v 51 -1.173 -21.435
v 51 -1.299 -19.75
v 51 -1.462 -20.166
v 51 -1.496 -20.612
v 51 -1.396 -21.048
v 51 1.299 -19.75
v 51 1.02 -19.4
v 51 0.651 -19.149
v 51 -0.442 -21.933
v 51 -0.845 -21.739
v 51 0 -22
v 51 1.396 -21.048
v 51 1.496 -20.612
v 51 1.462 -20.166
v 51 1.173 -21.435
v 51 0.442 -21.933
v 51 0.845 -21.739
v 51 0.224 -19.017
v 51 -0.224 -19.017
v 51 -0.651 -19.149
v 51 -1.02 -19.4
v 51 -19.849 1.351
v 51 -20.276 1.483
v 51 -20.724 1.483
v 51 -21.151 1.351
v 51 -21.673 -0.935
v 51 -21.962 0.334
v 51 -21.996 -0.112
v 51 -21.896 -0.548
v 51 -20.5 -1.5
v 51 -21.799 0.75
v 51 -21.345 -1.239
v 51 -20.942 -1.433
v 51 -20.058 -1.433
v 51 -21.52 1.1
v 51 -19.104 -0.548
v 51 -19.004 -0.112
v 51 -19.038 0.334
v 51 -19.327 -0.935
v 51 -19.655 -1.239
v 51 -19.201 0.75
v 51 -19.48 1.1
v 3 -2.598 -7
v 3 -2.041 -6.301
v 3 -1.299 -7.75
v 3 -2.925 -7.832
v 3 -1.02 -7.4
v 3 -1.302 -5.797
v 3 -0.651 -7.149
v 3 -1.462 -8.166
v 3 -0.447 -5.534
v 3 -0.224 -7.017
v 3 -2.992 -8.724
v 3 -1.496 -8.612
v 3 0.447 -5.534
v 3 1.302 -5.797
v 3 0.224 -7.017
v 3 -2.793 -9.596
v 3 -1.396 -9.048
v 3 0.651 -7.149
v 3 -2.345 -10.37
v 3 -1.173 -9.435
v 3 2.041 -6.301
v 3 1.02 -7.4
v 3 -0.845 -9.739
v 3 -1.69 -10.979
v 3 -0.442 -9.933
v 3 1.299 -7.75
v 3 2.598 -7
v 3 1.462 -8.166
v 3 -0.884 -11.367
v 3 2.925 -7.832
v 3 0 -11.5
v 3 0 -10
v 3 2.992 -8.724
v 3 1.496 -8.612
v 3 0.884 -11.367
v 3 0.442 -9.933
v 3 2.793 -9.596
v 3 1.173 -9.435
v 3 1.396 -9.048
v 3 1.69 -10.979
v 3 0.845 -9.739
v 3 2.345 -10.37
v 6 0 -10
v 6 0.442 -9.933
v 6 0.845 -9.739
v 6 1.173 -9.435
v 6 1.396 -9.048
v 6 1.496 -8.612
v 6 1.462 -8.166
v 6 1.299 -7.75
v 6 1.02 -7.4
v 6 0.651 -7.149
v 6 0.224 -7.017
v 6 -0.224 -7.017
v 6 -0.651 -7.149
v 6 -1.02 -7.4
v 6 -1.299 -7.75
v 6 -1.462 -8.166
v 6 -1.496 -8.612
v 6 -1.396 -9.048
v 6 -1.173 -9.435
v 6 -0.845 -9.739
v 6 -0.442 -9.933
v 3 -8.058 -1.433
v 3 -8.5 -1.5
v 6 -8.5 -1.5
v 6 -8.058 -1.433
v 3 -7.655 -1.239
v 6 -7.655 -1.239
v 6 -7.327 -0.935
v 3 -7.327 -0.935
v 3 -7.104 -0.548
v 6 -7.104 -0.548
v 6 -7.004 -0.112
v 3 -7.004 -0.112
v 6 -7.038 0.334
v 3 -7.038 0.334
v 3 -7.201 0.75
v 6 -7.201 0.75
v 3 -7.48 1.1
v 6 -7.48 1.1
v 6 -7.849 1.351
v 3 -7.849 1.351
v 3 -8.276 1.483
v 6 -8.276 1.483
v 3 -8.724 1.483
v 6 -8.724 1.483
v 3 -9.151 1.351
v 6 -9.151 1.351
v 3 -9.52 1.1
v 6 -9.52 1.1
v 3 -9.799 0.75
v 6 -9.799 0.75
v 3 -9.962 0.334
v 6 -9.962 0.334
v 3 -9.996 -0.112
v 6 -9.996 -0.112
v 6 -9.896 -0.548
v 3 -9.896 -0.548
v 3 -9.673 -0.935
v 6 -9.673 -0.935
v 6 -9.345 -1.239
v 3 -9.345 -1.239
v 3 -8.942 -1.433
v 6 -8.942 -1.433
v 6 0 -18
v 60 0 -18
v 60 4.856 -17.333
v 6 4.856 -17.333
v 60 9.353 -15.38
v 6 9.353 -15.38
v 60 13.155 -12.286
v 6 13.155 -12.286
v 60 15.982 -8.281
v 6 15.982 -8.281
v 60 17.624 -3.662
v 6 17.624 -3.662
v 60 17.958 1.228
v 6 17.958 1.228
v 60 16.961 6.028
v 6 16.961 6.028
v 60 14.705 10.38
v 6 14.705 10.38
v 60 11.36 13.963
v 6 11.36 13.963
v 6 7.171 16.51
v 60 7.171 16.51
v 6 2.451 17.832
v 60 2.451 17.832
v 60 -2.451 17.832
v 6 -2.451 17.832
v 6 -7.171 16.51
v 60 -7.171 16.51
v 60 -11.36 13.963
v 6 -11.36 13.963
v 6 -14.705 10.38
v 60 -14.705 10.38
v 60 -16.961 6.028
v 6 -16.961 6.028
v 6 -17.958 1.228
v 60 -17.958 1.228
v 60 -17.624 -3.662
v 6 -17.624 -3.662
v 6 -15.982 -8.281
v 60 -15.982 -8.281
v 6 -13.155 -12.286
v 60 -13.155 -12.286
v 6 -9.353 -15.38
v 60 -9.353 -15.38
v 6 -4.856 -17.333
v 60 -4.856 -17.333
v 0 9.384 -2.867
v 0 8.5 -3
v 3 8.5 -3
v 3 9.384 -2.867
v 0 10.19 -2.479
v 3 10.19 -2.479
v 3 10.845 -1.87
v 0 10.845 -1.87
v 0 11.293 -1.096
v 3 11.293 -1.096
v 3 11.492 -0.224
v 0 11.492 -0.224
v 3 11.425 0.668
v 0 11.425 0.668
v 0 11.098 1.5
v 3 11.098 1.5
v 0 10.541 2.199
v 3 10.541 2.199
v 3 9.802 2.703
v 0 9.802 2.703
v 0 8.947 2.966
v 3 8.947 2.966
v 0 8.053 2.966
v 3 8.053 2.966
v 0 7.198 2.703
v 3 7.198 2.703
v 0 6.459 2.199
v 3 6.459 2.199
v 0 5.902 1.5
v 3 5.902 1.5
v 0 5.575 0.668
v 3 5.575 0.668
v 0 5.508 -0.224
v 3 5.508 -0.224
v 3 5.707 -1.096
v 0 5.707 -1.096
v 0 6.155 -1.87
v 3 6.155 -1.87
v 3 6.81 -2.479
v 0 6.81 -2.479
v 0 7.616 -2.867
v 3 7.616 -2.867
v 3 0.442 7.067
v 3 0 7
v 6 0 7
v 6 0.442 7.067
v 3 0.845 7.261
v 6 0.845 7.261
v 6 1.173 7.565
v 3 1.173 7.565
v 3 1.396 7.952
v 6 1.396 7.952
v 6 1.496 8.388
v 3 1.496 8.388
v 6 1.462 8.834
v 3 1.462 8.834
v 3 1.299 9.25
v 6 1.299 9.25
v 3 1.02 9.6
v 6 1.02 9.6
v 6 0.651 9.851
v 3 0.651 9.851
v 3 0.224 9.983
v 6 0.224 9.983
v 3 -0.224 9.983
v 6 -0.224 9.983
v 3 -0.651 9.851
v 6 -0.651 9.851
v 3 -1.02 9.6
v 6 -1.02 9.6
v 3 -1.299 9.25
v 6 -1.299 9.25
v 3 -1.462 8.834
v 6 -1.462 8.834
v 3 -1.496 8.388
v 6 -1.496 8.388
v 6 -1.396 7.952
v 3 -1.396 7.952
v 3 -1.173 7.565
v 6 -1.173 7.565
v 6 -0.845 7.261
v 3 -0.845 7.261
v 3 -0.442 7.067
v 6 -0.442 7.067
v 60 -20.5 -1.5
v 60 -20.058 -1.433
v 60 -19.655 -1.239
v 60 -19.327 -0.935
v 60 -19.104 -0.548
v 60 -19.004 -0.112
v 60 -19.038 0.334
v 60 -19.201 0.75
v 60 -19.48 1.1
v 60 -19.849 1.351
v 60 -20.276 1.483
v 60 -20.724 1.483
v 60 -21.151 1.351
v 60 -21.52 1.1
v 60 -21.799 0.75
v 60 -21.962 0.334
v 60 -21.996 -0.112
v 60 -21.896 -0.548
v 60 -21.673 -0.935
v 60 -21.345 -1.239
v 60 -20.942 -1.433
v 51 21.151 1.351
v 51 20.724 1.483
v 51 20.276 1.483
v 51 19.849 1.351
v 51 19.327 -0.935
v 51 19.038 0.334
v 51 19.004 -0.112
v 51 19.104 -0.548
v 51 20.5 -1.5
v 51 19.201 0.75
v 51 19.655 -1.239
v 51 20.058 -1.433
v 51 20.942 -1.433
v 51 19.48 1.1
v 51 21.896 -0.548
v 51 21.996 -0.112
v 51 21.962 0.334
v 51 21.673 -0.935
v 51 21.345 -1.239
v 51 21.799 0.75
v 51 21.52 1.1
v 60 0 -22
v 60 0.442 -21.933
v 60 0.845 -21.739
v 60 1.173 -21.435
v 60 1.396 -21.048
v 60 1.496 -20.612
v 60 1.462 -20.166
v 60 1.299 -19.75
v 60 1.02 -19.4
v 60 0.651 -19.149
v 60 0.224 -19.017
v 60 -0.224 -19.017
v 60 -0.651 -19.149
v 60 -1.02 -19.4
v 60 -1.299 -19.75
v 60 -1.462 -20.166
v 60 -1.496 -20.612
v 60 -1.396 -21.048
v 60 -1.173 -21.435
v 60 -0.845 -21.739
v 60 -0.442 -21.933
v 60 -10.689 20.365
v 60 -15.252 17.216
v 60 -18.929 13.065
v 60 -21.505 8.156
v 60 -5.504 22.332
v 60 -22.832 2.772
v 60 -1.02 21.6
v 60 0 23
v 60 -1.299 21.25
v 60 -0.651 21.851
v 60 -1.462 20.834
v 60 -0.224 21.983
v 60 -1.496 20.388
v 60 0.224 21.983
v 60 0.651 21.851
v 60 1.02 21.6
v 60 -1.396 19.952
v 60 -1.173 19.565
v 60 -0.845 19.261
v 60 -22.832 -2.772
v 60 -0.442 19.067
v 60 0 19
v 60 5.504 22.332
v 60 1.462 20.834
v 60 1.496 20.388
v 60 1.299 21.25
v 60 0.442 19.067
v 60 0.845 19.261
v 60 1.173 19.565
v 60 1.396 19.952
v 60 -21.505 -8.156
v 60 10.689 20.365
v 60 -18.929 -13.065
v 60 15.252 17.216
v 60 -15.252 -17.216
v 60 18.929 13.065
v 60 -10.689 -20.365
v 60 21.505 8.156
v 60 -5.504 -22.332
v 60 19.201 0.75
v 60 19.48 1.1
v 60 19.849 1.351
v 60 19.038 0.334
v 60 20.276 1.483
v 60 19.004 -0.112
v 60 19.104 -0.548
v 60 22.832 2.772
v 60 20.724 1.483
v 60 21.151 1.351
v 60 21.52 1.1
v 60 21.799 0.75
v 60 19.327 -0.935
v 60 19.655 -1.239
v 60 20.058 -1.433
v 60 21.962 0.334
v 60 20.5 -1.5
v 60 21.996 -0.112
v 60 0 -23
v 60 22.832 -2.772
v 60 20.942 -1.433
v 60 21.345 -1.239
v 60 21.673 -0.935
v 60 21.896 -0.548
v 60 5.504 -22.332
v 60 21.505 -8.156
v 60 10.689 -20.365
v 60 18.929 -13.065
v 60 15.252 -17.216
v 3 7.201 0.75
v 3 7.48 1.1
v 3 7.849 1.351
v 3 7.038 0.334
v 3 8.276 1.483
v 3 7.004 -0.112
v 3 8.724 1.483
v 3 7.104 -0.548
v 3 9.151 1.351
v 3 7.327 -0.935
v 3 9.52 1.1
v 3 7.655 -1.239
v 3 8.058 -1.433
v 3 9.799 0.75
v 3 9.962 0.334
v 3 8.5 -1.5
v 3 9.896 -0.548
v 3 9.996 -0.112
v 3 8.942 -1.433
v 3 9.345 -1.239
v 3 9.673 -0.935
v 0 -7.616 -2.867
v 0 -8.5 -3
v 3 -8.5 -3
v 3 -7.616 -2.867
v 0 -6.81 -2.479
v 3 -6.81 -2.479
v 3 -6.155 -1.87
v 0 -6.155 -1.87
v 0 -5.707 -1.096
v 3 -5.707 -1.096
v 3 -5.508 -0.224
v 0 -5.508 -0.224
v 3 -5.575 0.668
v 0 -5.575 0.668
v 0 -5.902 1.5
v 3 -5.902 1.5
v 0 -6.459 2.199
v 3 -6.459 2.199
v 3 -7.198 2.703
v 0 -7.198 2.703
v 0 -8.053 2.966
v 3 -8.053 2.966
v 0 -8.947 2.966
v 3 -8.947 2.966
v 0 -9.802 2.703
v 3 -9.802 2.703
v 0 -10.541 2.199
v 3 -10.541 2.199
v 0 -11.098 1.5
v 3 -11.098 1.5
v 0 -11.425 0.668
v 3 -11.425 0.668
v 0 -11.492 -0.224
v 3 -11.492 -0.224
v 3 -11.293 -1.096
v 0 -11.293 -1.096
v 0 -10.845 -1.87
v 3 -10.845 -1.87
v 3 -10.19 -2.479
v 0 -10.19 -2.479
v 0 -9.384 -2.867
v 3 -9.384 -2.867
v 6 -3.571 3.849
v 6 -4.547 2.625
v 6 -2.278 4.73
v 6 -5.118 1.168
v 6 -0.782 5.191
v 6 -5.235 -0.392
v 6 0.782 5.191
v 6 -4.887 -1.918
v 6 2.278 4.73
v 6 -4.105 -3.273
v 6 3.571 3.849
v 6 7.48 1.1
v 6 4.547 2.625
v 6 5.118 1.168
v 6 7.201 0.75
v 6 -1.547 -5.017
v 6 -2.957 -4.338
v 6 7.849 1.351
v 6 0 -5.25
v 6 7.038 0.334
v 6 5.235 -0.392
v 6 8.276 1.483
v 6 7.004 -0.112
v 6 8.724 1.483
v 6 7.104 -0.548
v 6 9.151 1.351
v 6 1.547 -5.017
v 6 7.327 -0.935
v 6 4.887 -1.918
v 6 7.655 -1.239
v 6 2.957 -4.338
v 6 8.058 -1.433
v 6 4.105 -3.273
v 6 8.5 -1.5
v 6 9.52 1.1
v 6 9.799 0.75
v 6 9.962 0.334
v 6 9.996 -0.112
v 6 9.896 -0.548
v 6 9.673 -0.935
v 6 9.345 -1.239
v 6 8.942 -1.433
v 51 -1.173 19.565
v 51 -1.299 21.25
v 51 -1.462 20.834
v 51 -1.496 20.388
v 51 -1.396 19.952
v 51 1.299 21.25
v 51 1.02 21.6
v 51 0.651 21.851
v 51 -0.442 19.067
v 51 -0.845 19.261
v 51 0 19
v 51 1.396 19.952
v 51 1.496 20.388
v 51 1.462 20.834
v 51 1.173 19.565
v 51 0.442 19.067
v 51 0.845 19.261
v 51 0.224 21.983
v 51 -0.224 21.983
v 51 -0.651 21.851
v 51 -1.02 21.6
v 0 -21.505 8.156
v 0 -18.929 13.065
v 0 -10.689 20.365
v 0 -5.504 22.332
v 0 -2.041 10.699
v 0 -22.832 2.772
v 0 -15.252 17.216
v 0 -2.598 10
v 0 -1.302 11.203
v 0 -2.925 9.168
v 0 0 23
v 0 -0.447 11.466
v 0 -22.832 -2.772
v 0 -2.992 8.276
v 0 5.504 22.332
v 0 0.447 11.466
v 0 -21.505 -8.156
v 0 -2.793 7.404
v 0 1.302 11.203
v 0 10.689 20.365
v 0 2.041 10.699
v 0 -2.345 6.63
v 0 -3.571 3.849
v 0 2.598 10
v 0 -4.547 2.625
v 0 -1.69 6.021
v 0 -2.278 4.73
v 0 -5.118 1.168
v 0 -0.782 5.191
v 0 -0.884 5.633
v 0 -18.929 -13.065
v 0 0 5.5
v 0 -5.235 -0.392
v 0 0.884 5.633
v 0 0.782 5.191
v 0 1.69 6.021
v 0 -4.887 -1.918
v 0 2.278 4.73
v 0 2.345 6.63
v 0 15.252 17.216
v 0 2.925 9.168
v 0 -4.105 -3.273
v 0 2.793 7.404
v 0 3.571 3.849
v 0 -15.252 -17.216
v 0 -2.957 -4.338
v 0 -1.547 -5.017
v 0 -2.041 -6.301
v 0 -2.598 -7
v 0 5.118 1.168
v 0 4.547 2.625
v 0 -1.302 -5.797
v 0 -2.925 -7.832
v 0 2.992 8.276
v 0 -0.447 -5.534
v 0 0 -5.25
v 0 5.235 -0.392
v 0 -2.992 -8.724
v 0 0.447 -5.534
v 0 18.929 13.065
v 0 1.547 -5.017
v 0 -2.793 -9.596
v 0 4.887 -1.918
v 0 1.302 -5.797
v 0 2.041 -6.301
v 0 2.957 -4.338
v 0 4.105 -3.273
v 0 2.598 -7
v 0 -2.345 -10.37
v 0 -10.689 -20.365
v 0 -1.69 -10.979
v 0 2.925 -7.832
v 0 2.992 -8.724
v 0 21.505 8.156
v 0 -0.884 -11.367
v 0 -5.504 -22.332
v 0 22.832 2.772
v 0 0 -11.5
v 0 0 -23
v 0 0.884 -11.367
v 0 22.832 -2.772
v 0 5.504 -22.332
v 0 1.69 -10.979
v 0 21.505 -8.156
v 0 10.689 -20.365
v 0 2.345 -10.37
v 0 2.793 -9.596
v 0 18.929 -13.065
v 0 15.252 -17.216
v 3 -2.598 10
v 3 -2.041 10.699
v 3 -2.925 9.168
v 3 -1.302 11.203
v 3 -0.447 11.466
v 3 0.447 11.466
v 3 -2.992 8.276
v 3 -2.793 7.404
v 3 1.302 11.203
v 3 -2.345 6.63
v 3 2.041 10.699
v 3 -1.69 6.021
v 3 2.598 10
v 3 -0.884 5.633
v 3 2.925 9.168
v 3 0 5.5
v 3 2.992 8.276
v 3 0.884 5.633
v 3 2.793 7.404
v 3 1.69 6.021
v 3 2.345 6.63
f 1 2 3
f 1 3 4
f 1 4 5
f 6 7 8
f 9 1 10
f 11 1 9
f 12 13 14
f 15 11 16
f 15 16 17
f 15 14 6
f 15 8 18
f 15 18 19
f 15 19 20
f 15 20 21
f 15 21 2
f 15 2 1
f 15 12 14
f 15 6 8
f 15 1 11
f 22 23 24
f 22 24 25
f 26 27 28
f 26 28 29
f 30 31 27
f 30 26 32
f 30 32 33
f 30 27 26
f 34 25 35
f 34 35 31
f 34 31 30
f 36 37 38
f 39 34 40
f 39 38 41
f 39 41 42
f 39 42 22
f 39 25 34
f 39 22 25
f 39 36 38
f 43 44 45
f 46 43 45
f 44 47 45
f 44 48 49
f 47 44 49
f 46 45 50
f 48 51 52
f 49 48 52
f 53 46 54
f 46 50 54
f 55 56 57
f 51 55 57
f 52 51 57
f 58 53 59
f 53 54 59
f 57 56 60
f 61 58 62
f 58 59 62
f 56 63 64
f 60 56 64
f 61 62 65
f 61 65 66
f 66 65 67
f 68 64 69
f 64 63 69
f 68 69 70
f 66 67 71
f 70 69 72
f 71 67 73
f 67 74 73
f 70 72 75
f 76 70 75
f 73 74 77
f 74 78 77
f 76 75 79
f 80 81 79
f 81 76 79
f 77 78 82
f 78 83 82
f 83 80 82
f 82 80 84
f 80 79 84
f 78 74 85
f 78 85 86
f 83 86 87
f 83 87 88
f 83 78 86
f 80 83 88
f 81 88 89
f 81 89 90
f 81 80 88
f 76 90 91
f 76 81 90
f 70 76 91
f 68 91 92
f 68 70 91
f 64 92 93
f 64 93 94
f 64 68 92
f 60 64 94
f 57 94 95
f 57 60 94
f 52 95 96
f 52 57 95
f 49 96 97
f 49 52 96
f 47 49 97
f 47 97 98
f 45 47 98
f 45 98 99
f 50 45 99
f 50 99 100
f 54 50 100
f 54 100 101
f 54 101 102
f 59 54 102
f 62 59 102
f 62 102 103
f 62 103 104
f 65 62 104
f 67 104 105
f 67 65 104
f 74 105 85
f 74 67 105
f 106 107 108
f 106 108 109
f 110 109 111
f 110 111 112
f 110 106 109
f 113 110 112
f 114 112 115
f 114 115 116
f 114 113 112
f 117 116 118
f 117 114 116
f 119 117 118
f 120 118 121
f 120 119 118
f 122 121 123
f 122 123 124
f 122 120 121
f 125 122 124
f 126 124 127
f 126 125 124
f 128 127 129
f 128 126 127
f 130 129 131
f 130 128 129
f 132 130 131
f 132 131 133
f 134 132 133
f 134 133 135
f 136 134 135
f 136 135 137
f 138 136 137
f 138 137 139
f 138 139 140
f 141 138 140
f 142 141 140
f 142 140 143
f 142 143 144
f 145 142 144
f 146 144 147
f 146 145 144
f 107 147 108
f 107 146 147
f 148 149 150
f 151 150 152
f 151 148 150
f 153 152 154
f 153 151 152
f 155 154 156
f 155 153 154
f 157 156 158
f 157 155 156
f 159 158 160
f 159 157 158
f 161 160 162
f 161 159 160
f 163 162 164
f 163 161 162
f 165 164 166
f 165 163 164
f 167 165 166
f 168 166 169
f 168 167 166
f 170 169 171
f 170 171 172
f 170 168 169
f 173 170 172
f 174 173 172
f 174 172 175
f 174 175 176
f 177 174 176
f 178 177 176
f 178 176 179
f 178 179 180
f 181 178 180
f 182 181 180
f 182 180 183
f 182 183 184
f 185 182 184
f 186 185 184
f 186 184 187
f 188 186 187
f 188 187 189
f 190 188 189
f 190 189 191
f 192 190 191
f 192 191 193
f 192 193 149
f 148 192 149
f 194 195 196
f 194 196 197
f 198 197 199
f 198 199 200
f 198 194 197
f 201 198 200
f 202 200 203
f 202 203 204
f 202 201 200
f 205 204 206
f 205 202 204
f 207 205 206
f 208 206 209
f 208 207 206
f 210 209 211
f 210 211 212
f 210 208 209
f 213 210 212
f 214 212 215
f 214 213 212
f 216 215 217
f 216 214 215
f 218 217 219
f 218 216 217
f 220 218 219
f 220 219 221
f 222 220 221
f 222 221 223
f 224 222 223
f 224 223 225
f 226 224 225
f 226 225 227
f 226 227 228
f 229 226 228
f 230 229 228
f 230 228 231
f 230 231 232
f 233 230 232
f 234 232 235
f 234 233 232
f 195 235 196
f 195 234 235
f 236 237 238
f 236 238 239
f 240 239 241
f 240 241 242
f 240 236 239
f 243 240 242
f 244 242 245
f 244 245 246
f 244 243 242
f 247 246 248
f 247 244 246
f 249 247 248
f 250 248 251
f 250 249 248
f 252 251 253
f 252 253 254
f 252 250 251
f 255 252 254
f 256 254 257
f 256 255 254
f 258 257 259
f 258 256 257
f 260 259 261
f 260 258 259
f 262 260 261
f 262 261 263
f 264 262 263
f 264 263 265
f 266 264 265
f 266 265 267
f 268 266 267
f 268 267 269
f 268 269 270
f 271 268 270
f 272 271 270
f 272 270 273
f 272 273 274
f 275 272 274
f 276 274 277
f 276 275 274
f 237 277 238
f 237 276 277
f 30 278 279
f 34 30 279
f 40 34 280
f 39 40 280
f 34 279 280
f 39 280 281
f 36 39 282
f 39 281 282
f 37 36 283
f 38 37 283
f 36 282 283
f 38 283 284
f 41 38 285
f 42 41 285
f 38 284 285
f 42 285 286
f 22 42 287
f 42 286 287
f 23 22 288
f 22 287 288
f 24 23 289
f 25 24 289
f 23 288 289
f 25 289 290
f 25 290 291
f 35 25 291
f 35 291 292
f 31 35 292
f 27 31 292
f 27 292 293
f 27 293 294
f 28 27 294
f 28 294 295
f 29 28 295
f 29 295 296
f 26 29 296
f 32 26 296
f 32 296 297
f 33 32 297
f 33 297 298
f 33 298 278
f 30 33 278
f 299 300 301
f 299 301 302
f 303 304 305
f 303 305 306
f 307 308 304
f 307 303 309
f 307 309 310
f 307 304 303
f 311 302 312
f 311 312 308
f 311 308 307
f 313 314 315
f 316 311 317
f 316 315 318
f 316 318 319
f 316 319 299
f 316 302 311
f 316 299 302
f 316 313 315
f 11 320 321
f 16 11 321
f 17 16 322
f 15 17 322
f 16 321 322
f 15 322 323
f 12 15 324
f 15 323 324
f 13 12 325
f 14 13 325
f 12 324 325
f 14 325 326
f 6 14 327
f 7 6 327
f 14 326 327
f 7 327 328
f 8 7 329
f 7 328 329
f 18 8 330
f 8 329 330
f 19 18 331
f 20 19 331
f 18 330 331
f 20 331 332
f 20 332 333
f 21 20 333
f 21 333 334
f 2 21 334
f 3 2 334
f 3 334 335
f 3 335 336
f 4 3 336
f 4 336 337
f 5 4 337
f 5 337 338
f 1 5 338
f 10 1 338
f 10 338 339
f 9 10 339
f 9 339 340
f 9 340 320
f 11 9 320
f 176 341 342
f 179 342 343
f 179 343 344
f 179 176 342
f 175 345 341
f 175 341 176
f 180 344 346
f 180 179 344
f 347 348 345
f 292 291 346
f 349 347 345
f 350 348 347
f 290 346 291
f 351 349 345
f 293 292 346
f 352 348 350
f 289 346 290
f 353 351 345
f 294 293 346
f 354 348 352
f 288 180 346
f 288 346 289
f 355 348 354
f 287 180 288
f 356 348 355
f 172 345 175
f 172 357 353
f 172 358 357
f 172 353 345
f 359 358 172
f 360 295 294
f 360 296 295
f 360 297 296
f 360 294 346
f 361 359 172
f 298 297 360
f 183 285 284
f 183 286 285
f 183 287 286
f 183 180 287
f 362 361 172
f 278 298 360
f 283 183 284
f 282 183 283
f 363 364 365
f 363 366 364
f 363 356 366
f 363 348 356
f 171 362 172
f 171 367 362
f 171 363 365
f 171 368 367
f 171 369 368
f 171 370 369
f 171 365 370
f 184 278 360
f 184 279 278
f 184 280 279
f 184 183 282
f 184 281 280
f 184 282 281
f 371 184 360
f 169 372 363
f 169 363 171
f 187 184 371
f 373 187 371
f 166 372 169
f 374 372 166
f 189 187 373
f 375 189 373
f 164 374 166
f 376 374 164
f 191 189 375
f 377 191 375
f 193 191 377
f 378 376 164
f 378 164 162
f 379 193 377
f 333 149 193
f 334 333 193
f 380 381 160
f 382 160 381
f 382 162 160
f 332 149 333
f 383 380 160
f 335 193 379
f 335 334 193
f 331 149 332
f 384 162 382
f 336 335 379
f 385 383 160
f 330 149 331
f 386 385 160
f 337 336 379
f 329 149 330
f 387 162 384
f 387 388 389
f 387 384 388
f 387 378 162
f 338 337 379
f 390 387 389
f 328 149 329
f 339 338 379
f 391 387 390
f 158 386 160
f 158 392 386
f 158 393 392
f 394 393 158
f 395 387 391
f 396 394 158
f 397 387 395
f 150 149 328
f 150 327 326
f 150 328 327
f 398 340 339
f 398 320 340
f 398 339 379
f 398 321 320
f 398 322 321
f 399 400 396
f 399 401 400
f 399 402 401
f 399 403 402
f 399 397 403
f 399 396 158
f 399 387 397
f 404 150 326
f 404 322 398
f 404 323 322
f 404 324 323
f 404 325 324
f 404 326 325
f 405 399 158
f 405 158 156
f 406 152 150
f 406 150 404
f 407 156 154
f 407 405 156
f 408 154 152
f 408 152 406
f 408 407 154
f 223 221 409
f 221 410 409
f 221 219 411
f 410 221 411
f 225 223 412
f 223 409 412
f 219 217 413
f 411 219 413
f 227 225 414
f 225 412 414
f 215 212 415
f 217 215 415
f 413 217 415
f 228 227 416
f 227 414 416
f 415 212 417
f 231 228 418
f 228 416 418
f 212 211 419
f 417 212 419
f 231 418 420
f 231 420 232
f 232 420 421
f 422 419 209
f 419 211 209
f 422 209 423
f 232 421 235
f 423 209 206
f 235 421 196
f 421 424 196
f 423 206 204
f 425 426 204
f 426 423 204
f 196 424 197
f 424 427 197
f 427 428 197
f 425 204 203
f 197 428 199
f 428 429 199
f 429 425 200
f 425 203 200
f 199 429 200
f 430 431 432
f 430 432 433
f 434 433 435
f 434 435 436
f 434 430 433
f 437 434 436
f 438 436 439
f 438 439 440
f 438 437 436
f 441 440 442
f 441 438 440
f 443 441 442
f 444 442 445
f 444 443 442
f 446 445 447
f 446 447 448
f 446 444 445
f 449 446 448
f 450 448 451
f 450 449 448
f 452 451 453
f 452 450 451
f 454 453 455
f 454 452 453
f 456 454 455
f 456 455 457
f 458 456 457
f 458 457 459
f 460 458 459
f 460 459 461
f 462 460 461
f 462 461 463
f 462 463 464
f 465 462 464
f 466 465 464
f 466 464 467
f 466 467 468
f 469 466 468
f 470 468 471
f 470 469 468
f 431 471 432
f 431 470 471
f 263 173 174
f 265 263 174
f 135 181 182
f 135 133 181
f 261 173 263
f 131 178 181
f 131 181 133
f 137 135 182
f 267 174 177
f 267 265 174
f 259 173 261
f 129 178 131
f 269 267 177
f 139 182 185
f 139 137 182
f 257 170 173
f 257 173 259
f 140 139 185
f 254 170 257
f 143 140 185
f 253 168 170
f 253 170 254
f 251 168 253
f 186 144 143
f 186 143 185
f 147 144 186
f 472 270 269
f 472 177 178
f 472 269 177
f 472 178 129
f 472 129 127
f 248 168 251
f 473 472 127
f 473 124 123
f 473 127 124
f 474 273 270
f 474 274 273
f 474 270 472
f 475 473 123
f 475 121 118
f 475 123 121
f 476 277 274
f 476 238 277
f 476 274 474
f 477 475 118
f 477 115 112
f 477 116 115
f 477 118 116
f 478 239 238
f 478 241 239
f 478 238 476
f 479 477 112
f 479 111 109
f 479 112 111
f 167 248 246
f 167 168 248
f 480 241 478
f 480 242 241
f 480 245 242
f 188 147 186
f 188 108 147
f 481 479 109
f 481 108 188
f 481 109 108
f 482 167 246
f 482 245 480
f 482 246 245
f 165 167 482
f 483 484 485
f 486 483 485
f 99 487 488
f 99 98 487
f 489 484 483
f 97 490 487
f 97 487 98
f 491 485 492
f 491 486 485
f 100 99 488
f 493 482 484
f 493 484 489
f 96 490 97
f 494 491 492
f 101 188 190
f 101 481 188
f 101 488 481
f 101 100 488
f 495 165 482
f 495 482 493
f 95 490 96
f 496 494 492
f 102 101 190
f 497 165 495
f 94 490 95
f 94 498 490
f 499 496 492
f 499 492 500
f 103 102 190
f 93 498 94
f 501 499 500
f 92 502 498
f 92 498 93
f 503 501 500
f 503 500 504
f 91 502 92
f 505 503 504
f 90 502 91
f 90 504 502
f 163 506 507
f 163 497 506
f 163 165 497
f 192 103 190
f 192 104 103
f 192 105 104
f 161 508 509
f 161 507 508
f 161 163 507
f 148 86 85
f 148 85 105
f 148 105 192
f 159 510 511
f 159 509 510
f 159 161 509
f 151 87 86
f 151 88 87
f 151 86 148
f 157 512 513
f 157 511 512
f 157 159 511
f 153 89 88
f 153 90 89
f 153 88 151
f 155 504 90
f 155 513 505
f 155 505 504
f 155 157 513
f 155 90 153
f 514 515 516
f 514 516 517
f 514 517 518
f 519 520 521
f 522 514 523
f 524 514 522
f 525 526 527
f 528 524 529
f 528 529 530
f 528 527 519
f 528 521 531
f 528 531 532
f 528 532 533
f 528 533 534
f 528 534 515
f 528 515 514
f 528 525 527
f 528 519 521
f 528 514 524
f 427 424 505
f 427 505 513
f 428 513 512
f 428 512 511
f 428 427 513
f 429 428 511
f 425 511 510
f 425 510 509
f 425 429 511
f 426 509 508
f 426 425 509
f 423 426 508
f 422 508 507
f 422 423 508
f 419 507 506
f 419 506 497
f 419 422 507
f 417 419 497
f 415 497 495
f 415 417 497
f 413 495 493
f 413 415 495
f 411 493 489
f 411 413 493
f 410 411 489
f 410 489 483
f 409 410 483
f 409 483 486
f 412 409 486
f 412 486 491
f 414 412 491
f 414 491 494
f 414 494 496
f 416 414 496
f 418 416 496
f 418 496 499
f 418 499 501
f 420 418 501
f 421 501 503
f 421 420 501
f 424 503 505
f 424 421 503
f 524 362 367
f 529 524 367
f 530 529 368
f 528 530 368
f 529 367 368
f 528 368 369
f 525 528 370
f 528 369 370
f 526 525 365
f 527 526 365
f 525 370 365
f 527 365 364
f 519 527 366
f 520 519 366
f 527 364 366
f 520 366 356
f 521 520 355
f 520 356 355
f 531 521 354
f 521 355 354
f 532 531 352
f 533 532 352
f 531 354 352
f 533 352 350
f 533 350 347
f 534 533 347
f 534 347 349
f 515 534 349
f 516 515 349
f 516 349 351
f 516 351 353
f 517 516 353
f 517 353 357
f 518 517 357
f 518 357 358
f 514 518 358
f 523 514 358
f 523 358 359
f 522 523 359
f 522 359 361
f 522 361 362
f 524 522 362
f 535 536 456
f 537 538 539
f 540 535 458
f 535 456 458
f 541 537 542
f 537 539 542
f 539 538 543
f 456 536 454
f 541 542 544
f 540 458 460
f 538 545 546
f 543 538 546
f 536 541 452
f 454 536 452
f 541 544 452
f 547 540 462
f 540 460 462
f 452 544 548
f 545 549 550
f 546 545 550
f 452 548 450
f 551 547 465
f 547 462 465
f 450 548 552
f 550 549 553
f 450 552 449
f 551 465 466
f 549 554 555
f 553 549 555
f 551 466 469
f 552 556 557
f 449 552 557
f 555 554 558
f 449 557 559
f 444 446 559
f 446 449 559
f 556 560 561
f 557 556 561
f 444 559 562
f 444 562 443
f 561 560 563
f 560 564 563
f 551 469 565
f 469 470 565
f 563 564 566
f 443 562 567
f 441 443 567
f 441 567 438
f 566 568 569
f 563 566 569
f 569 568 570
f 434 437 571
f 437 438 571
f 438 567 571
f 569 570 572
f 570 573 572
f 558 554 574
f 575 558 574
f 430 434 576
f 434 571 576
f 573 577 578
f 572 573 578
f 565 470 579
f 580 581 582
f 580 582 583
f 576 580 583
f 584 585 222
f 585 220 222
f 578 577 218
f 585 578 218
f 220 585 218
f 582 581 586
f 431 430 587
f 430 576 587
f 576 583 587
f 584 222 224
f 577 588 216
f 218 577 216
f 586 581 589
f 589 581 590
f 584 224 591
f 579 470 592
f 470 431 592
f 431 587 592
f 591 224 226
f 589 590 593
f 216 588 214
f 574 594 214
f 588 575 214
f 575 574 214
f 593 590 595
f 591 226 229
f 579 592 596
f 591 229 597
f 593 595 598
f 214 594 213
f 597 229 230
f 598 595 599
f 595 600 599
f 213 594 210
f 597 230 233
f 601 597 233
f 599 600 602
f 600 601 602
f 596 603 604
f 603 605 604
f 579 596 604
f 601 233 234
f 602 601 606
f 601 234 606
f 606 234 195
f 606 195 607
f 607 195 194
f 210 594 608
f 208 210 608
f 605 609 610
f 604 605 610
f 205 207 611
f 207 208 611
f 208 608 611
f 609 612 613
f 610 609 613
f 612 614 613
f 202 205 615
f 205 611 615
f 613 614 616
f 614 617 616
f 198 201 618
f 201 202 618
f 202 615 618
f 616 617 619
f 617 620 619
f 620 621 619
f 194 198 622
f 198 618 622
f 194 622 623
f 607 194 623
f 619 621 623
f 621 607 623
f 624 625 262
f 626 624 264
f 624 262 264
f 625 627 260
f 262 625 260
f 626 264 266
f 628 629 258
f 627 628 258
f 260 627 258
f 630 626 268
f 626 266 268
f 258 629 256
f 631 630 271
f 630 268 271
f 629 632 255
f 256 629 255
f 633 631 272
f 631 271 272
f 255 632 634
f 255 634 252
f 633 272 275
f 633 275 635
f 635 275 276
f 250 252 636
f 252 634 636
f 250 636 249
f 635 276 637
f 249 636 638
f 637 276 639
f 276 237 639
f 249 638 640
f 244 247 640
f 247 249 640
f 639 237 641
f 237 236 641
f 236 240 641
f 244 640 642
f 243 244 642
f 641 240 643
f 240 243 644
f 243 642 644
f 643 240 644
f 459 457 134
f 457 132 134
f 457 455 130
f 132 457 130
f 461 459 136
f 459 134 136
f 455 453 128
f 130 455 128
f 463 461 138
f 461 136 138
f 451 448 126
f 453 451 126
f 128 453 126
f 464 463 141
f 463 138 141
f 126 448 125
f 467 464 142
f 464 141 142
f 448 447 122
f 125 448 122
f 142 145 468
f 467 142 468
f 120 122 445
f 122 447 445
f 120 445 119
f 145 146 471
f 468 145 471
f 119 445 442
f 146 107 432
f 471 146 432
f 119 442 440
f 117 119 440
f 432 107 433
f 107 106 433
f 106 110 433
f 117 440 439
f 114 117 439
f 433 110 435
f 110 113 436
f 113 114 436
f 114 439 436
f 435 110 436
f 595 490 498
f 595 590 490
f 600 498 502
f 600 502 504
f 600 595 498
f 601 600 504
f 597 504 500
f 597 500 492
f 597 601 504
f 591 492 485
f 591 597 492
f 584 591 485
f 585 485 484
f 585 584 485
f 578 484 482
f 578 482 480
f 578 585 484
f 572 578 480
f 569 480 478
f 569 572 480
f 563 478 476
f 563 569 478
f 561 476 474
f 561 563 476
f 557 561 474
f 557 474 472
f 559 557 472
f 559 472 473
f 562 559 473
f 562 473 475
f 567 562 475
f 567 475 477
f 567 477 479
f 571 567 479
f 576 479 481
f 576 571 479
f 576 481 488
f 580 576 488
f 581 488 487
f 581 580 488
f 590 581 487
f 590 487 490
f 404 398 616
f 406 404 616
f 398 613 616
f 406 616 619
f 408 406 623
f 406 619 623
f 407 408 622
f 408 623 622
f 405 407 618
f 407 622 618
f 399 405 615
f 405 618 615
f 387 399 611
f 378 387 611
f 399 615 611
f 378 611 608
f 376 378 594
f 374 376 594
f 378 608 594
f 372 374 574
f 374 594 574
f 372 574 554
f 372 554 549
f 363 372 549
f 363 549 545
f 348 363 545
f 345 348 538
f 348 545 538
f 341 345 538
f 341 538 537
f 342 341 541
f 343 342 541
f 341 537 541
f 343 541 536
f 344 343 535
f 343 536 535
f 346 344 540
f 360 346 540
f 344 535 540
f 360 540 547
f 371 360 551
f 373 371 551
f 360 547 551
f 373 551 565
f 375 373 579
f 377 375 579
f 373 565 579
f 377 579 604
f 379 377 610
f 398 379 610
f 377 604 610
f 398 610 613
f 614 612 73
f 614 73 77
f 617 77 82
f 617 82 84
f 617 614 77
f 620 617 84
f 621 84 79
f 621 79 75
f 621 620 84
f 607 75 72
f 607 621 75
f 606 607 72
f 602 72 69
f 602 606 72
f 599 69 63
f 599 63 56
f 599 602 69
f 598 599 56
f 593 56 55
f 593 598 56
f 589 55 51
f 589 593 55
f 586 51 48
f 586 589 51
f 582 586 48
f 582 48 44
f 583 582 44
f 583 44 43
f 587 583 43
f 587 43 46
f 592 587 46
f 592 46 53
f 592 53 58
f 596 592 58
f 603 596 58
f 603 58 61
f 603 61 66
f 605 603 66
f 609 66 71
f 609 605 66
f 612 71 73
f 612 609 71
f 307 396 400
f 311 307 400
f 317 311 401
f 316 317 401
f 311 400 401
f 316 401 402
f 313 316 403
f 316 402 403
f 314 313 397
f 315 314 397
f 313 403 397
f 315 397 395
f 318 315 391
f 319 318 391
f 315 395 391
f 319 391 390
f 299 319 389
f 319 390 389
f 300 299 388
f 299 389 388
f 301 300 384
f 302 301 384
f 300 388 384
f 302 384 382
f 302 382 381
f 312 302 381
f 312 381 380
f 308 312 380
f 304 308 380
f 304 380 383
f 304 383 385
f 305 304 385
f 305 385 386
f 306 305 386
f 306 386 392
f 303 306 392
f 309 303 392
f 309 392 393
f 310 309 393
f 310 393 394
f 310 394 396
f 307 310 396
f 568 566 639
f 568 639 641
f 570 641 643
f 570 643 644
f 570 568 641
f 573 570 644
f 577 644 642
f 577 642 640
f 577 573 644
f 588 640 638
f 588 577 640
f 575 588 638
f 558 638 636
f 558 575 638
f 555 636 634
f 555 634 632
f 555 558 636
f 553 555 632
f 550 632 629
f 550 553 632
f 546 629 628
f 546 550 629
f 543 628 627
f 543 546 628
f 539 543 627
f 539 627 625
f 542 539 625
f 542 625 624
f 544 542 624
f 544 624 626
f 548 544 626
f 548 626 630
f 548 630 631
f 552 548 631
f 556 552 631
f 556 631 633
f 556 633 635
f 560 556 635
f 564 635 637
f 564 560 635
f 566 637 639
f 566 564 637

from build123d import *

# Parameters (mm, degrees)
SKETCH1_R           = 23
SKETCH1_R_2         = 18
BOSS_EXTRUDE1_DEPTH = 11
SKETCH1_13_R        = 23
SKETCH1_13_R_2      = 18
SKETCH1_13_R_3      = 3
SKETCH1_13_R_4      = 5.25
BOSS_EXTRUDE2_DEPTH = 3
BOSS_EXTRUDE4_START = 3
SKETCH1_16_R        = 23
SKETCH1_16_R_2      = 18
SKETCH1_16_R_3      = 3
SKETCH1_16_R_4      = 5.25
SKETCH1_16_R_5      = 1.5
BOSS_EXTRUDE4_DEPTH = 3
SKETCH1_17_R        = 23
SKETCH1_17_R_2      = 18
BOSS_EXTRUDE5_DEPTH = 60
SKETCH2_R           = 1.5
CUT_EXTRUDE1_DEPTH  = 5
BOSS_EXTRUDE6_START = 6
SKETCH1_20_R        = 3
SKETCH1_20_R_2      = 1.5
BOSS_EXTRUDE6_DEPTH = 3
SKETCH1_21_R        = 23
SKETCH1_21_R_2      = 18
CUT_EXTRUDE4_DEPTH  = 23
SKETCH2_2_R         = 1.5
CUT_EXTRUDE5_DEPTH  = 9


with BuildPart() as part:
    # Sketch1 → Boss-Extrude1 (new body)
    with BuildSketch(Plane(origin=(0, 0, 0), x_dir=(0, 0, -1), z_dir=(1, 0, 0))):
        Circle(SKETCH1_R)
        Circle(SKETCH1_R_2, mode=Mode.SUBTRACT)
    extrude(amount=-BOSS_EXTRUDE1_DEPTH)

    # Sketch1_13 → Boss-Extrude2 (add)
    with BuildSketch(Plane(origin=(0, 0, 0), x_dir=(0, 0, -1), z_dir=(1, 0, 0))):
        Circle(SKETCH1_13_R)
        Circle(SKETCH1_13_R_2, mode=Mode.SUBTRACT)
        Circle(SKETCH1_13_R_2)
        with Locations((-8.5, 0)):
            Circle(SKETCH1_13_R_3, mode=Mode.SUBTRACT)
        with Locations((8.5, 0)):
            Circle(SKETCH1_13_R_3, mode=Mode.SUBTRACT)
        Circle(SKETCH1_13_R_4, mode=Mode.SUBTRACT)
        with Locations((0, -8.5)):
            Circle(SKETCH1_13_R_3, mode=Mode.SUBTRACT)
        with Locations((0, 8.5)):
            Circle(SKETCH1_13_R_3, mode=Mode.SUBTRACT)
    extrude(amount=BOSS_EXTRUDE2_DEPTH)

    # Sketch1_16 → Boss-Extrude4 (add)
    with BuildSketch(Plane(origin=(0, 0, 0), x_dir=(0, 0, -1), z_dir=(1, 0, 0)).offset(BOSS_EXTRUDE4_START)):
        Circle(SKETCH1_16_R)
        Circle(SKETCH1_16_R_2, mode=Mode.SUBTRACT)
        Circle(SKETCH1_16_R_2)
        with Locations((-8.5, 0)):
            Circle(SKETCH1_16_R_3, mode=Mode.SUBTRACT)
        with Locations((8.5, 0)):
            Circle(SKETCH1_16_R_3, mode=Mode.SUBTRACT)
        Circle(SKETCH1_16_R_4, mode=Mode.SUBTRACT)
        with Locations((0, -8.5)):
            Circle(SKETCH1_16_R_3, mode=Mode.SUBTRACT)
        with Locations((0, 8.5)):
            Circle(SKETCH1_16_R_3, mode=Mode.SUBTRACT)
        with Locations((0, 8.5)):
            Circle(SKETCH1_16_R_3)
        with Locations((0, 8.5)):
            Circle(SKETCH1_16_R_5, mode=Mode.SUBTRACT)
        with Locations((-8.5, 0)):
            Circle(SKETCH1_16_R_3)
        with Locations((-8.5, 0)):
            Circle(SKETCH1_16_R_5, mode=Mode.SUBTRACT)
        with Locations((0, -8.5)):
            Circle(SKETCH1_16_R_3)
        with Locations((0, -8.5)):
            Circle(SKETCH1_16_R_5, mode=Mode.SUBTRACT)
        with Locations((8.5, 0)):
            Circle(SKETCH1_16_R_3)
        with Locations((8.5, 0)):
            Circle(SKETCH1_16_R_5, mode=Mode.SUBTRACT)
    extrude(amount=BOSS_EXTRUDE4_DEPTH)

    # Sketch1_17 → Boss-Extrude5 (add)
    with BuildSketch(Plane(origin=(0, 0, 0), x_dir=(0, 0, -1), z_dir=(1, 0, 0))):
        Circle(SKETCH1_17_R)
        Circle(SKETCH1_17_R_2, mode=Mode.SUBTRACT)
    extrude(amount=BOSS_EXTRUDE5_DEPTH)

    # Sketch2 → Cut-Extrude1 (cut)
    with BuildSketch(Plane(origin=(60, 0, 0), x_dir=(0, 0, -1), z_dir=(1, 0, 0))):
        with Locations((0, 20.5)):
            Circle(SKETCH2_R)
        with Locations((20.5, 0)):
            Circle(SKETCH2_R)
        with Locations((0, -20.5)):
            Circle(SKETCH2_R)
        with Locations((-20.5, 0)):
            Circle(SKETCH2_R)
    extrude(amount=-CUT_EXTRUDE1_DEPTH, mode=Mode.SUBTRACT)

    # Sketch1_20 → Boss-Extrude6 (add)
    with BuildSketch(Plane(origin=(0, 0, 0), x_dir=(0, 0, -1), z_dir=(1, 0, 0)).offset(BOSS_EXTRUDE6_START)):
        with Locations((0, 8.5)):
            Circle(SKETCH1_20_R)
        with Locations((0, 8.5)):
            Circle(SKETCH1_20_R_2, mode=Mode.SUBTRACT)
        with Locations((-8.5, 0)):
            Circle(SKETCH1_20_R)
        with Locations((-8.5, 0)):
            Circle(SKETCH1_20_R_2, mode=Mode.SUBTRACT)
        with Locations((0, -8.5)):
            Circle(SKETCH1_20_R)
        with Locations((0, -8.5)):
            Circle(SKETCH1_20_R_2, mode=Mode.SUBTRACT)
        with Locations((8.5, 0)):
            Circle(SKETCH1_20_R)
        with Locations((8.5, 0)):
            Circle(SKETCH1_20_R_2, mode=Mode.SUBTRACT)
    extrude(amount=-BOSS_EXTRUDE6_DEPTH)

    # Sketch1_21 → Cut-Extrude4 (cut)
    with BuildSketch(Plane(origin=(0, 0, 0), x_dir=(0, 0, -1), z_dir=(1, 0, 0))):
        Circle(SKETCH1_21_R)
        Circle(SKETCH1_21_R_2, mode=Mode.SUBTRACT)
    extrude(amount=-CUT_EXTRUDE4_DEPTH, mode=Mode.SUBTRACT)

    # Sketch2_2 → Cut-Extrude5 (cut)
    with BuildSketch(Plane(origin=(60, 0, 0), x_dir=(0, 0, -1), z_dir=(1, 0, 0))):
        with Locations((0, 20.5)):
            Circle(SKETCH2_2_R)
        with Locations((20.5, 0)):
            Circle(SKETCH2_2_R)
        with Locations((0, -20.5)):
            Circle(SKETCH2_2_R)
        with Locations((-20.5, 0)):
            Circle(SKETCH2_2_R)
    extrude(amount=-CUT_EXTRUDE5_DEPTH, mode=Mode.SUBTRACT)


solid = part.part
